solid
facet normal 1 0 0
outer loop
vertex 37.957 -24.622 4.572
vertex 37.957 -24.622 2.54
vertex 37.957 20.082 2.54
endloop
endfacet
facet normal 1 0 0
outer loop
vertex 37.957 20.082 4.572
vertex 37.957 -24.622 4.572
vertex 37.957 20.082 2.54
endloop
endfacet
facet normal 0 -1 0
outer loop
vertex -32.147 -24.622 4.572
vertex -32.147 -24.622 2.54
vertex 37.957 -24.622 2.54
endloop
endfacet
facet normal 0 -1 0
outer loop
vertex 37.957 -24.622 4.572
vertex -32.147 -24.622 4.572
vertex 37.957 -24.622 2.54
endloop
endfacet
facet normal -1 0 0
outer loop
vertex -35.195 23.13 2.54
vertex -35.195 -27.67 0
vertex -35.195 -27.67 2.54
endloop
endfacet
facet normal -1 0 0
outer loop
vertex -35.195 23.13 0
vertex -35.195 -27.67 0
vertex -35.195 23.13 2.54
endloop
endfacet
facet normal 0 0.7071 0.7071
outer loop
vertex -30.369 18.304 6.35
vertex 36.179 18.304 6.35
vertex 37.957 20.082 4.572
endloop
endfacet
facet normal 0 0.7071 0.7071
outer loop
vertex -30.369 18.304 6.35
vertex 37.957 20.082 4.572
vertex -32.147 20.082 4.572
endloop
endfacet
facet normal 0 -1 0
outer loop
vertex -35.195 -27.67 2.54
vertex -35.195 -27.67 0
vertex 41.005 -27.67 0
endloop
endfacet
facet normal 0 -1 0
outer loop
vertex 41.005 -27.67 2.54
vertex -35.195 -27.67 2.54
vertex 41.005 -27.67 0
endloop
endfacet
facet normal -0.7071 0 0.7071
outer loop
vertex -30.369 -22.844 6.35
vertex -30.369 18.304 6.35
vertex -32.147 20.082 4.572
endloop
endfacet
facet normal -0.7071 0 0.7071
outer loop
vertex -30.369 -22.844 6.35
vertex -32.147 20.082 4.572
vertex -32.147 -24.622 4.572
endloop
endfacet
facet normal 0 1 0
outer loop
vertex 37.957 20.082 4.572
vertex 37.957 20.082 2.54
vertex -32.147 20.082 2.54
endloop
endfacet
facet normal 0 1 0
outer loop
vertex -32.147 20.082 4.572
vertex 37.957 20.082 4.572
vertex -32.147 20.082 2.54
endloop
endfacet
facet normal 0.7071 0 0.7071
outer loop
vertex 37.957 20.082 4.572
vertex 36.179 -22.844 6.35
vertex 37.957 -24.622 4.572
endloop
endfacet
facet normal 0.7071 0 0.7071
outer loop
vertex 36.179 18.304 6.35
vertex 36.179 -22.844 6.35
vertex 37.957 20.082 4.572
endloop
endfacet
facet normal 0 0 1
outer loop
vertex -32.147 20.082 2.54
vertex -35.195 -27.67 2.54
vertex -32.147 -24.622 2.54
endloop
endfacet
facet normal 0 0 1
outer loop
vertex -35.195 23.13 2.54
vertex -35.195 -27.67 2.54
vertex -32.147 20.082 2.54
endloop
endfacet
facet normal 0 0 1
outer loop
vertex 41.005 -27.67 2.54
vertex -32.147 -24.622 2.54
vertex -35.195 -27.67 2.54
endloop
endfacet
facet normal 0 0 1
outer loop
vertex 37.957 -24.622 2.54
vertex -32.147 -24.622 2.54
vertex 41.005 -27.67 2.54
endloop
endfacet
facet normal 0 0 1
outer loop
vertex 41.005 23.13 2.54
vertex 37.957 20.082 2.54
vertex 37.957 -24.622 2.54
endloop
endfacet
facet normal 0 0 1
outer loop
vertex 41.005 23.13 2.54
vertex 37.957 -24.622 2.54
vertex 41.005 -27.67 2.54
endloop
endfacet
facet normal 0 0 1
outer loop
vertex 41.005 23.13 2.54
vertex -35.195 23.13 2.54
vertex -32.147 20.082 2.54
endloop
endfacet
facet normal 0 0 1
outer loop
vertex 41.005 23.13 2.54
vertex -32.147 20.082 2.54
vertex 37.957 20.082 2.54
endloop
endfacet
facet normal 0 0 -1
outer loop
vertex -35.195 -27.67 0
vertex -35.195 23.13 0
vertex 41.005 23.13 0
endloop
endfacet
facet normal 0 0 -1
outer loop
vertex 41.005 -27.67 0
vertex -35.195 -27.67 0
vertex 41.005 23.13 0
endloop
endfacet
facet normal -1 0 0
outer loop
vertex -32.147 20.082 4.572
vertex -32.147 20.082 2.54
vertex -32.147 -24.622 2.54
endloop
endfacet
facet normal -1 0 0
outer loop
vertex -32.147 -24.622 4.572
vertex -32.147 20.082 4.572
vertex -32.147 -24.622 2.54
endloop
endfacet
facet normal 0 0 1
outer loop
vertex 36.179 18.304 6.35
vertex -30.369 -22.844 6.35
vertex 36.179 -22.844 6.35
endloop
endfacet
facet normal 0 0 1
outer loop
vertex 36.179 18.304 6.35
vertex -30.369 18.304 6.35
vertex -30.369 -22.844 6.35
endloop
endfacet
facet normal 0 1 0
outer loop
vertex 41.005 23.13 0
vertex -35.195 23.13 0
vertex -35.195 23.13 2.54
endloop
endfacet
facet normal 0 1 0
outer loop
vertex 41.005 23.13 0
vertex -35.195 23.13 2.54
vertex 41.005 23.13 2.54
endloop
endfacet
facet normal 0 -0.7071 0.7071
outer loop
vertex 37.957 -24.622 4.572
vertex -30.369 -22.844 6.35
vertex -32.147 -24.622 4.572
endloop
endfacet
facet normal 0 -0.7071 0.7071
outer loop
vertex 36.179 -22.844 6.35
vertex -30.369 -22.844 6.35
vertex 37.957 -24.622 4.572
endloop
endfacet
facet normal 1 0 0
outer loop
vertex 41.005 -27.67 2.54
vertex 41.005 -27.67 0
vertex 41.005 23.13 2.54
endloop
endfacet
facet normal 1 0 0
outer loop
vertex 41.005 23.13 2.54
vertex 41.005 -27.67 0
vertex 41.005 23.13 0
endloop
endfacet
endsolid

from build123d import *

# Parameters (mm, degrees)
F0_W     = 76.2
F0_H     = 50.8
F1_DEPTH = 2.54
F3_DEPTH = 3.81
F4_SIZE  = 1.778


with BuildPart() as f1:
    # F0 (on Top) → F1 (new body)
    with BuildSketch(Plane.XY):
        with Locations((2.905123, -2.270125)):
            Rectangle(F0_W, F0_H)
    extrude(amount=F1_DEPTH)

    # F2 (on face) → F3 (join)
    with BuildSketch(Plane.XY.offset(2.54)):
        Polygon((37.957123, 20.081875), (-32.146877, 20.081875), (-32.146877, -24.622125), (37.957123, -24.622125), (37.957123, 4.333875), align=None)
    extrude(amount=F3_DEPTH)

    # F4
    f4_edges = [f1.edges().sort_by_distance(p)[0] for p in [
        (2.905123, -24.622125, 6.35),
        (-32.146877, -2.270125, 6.35),
        (37.957123, -2.270125, 6.35),
        (2.905123, 20.081875, 6.35),
    ]]
    chamfer(f4_edges, length=F4_SIZE)


solid = f1.part
